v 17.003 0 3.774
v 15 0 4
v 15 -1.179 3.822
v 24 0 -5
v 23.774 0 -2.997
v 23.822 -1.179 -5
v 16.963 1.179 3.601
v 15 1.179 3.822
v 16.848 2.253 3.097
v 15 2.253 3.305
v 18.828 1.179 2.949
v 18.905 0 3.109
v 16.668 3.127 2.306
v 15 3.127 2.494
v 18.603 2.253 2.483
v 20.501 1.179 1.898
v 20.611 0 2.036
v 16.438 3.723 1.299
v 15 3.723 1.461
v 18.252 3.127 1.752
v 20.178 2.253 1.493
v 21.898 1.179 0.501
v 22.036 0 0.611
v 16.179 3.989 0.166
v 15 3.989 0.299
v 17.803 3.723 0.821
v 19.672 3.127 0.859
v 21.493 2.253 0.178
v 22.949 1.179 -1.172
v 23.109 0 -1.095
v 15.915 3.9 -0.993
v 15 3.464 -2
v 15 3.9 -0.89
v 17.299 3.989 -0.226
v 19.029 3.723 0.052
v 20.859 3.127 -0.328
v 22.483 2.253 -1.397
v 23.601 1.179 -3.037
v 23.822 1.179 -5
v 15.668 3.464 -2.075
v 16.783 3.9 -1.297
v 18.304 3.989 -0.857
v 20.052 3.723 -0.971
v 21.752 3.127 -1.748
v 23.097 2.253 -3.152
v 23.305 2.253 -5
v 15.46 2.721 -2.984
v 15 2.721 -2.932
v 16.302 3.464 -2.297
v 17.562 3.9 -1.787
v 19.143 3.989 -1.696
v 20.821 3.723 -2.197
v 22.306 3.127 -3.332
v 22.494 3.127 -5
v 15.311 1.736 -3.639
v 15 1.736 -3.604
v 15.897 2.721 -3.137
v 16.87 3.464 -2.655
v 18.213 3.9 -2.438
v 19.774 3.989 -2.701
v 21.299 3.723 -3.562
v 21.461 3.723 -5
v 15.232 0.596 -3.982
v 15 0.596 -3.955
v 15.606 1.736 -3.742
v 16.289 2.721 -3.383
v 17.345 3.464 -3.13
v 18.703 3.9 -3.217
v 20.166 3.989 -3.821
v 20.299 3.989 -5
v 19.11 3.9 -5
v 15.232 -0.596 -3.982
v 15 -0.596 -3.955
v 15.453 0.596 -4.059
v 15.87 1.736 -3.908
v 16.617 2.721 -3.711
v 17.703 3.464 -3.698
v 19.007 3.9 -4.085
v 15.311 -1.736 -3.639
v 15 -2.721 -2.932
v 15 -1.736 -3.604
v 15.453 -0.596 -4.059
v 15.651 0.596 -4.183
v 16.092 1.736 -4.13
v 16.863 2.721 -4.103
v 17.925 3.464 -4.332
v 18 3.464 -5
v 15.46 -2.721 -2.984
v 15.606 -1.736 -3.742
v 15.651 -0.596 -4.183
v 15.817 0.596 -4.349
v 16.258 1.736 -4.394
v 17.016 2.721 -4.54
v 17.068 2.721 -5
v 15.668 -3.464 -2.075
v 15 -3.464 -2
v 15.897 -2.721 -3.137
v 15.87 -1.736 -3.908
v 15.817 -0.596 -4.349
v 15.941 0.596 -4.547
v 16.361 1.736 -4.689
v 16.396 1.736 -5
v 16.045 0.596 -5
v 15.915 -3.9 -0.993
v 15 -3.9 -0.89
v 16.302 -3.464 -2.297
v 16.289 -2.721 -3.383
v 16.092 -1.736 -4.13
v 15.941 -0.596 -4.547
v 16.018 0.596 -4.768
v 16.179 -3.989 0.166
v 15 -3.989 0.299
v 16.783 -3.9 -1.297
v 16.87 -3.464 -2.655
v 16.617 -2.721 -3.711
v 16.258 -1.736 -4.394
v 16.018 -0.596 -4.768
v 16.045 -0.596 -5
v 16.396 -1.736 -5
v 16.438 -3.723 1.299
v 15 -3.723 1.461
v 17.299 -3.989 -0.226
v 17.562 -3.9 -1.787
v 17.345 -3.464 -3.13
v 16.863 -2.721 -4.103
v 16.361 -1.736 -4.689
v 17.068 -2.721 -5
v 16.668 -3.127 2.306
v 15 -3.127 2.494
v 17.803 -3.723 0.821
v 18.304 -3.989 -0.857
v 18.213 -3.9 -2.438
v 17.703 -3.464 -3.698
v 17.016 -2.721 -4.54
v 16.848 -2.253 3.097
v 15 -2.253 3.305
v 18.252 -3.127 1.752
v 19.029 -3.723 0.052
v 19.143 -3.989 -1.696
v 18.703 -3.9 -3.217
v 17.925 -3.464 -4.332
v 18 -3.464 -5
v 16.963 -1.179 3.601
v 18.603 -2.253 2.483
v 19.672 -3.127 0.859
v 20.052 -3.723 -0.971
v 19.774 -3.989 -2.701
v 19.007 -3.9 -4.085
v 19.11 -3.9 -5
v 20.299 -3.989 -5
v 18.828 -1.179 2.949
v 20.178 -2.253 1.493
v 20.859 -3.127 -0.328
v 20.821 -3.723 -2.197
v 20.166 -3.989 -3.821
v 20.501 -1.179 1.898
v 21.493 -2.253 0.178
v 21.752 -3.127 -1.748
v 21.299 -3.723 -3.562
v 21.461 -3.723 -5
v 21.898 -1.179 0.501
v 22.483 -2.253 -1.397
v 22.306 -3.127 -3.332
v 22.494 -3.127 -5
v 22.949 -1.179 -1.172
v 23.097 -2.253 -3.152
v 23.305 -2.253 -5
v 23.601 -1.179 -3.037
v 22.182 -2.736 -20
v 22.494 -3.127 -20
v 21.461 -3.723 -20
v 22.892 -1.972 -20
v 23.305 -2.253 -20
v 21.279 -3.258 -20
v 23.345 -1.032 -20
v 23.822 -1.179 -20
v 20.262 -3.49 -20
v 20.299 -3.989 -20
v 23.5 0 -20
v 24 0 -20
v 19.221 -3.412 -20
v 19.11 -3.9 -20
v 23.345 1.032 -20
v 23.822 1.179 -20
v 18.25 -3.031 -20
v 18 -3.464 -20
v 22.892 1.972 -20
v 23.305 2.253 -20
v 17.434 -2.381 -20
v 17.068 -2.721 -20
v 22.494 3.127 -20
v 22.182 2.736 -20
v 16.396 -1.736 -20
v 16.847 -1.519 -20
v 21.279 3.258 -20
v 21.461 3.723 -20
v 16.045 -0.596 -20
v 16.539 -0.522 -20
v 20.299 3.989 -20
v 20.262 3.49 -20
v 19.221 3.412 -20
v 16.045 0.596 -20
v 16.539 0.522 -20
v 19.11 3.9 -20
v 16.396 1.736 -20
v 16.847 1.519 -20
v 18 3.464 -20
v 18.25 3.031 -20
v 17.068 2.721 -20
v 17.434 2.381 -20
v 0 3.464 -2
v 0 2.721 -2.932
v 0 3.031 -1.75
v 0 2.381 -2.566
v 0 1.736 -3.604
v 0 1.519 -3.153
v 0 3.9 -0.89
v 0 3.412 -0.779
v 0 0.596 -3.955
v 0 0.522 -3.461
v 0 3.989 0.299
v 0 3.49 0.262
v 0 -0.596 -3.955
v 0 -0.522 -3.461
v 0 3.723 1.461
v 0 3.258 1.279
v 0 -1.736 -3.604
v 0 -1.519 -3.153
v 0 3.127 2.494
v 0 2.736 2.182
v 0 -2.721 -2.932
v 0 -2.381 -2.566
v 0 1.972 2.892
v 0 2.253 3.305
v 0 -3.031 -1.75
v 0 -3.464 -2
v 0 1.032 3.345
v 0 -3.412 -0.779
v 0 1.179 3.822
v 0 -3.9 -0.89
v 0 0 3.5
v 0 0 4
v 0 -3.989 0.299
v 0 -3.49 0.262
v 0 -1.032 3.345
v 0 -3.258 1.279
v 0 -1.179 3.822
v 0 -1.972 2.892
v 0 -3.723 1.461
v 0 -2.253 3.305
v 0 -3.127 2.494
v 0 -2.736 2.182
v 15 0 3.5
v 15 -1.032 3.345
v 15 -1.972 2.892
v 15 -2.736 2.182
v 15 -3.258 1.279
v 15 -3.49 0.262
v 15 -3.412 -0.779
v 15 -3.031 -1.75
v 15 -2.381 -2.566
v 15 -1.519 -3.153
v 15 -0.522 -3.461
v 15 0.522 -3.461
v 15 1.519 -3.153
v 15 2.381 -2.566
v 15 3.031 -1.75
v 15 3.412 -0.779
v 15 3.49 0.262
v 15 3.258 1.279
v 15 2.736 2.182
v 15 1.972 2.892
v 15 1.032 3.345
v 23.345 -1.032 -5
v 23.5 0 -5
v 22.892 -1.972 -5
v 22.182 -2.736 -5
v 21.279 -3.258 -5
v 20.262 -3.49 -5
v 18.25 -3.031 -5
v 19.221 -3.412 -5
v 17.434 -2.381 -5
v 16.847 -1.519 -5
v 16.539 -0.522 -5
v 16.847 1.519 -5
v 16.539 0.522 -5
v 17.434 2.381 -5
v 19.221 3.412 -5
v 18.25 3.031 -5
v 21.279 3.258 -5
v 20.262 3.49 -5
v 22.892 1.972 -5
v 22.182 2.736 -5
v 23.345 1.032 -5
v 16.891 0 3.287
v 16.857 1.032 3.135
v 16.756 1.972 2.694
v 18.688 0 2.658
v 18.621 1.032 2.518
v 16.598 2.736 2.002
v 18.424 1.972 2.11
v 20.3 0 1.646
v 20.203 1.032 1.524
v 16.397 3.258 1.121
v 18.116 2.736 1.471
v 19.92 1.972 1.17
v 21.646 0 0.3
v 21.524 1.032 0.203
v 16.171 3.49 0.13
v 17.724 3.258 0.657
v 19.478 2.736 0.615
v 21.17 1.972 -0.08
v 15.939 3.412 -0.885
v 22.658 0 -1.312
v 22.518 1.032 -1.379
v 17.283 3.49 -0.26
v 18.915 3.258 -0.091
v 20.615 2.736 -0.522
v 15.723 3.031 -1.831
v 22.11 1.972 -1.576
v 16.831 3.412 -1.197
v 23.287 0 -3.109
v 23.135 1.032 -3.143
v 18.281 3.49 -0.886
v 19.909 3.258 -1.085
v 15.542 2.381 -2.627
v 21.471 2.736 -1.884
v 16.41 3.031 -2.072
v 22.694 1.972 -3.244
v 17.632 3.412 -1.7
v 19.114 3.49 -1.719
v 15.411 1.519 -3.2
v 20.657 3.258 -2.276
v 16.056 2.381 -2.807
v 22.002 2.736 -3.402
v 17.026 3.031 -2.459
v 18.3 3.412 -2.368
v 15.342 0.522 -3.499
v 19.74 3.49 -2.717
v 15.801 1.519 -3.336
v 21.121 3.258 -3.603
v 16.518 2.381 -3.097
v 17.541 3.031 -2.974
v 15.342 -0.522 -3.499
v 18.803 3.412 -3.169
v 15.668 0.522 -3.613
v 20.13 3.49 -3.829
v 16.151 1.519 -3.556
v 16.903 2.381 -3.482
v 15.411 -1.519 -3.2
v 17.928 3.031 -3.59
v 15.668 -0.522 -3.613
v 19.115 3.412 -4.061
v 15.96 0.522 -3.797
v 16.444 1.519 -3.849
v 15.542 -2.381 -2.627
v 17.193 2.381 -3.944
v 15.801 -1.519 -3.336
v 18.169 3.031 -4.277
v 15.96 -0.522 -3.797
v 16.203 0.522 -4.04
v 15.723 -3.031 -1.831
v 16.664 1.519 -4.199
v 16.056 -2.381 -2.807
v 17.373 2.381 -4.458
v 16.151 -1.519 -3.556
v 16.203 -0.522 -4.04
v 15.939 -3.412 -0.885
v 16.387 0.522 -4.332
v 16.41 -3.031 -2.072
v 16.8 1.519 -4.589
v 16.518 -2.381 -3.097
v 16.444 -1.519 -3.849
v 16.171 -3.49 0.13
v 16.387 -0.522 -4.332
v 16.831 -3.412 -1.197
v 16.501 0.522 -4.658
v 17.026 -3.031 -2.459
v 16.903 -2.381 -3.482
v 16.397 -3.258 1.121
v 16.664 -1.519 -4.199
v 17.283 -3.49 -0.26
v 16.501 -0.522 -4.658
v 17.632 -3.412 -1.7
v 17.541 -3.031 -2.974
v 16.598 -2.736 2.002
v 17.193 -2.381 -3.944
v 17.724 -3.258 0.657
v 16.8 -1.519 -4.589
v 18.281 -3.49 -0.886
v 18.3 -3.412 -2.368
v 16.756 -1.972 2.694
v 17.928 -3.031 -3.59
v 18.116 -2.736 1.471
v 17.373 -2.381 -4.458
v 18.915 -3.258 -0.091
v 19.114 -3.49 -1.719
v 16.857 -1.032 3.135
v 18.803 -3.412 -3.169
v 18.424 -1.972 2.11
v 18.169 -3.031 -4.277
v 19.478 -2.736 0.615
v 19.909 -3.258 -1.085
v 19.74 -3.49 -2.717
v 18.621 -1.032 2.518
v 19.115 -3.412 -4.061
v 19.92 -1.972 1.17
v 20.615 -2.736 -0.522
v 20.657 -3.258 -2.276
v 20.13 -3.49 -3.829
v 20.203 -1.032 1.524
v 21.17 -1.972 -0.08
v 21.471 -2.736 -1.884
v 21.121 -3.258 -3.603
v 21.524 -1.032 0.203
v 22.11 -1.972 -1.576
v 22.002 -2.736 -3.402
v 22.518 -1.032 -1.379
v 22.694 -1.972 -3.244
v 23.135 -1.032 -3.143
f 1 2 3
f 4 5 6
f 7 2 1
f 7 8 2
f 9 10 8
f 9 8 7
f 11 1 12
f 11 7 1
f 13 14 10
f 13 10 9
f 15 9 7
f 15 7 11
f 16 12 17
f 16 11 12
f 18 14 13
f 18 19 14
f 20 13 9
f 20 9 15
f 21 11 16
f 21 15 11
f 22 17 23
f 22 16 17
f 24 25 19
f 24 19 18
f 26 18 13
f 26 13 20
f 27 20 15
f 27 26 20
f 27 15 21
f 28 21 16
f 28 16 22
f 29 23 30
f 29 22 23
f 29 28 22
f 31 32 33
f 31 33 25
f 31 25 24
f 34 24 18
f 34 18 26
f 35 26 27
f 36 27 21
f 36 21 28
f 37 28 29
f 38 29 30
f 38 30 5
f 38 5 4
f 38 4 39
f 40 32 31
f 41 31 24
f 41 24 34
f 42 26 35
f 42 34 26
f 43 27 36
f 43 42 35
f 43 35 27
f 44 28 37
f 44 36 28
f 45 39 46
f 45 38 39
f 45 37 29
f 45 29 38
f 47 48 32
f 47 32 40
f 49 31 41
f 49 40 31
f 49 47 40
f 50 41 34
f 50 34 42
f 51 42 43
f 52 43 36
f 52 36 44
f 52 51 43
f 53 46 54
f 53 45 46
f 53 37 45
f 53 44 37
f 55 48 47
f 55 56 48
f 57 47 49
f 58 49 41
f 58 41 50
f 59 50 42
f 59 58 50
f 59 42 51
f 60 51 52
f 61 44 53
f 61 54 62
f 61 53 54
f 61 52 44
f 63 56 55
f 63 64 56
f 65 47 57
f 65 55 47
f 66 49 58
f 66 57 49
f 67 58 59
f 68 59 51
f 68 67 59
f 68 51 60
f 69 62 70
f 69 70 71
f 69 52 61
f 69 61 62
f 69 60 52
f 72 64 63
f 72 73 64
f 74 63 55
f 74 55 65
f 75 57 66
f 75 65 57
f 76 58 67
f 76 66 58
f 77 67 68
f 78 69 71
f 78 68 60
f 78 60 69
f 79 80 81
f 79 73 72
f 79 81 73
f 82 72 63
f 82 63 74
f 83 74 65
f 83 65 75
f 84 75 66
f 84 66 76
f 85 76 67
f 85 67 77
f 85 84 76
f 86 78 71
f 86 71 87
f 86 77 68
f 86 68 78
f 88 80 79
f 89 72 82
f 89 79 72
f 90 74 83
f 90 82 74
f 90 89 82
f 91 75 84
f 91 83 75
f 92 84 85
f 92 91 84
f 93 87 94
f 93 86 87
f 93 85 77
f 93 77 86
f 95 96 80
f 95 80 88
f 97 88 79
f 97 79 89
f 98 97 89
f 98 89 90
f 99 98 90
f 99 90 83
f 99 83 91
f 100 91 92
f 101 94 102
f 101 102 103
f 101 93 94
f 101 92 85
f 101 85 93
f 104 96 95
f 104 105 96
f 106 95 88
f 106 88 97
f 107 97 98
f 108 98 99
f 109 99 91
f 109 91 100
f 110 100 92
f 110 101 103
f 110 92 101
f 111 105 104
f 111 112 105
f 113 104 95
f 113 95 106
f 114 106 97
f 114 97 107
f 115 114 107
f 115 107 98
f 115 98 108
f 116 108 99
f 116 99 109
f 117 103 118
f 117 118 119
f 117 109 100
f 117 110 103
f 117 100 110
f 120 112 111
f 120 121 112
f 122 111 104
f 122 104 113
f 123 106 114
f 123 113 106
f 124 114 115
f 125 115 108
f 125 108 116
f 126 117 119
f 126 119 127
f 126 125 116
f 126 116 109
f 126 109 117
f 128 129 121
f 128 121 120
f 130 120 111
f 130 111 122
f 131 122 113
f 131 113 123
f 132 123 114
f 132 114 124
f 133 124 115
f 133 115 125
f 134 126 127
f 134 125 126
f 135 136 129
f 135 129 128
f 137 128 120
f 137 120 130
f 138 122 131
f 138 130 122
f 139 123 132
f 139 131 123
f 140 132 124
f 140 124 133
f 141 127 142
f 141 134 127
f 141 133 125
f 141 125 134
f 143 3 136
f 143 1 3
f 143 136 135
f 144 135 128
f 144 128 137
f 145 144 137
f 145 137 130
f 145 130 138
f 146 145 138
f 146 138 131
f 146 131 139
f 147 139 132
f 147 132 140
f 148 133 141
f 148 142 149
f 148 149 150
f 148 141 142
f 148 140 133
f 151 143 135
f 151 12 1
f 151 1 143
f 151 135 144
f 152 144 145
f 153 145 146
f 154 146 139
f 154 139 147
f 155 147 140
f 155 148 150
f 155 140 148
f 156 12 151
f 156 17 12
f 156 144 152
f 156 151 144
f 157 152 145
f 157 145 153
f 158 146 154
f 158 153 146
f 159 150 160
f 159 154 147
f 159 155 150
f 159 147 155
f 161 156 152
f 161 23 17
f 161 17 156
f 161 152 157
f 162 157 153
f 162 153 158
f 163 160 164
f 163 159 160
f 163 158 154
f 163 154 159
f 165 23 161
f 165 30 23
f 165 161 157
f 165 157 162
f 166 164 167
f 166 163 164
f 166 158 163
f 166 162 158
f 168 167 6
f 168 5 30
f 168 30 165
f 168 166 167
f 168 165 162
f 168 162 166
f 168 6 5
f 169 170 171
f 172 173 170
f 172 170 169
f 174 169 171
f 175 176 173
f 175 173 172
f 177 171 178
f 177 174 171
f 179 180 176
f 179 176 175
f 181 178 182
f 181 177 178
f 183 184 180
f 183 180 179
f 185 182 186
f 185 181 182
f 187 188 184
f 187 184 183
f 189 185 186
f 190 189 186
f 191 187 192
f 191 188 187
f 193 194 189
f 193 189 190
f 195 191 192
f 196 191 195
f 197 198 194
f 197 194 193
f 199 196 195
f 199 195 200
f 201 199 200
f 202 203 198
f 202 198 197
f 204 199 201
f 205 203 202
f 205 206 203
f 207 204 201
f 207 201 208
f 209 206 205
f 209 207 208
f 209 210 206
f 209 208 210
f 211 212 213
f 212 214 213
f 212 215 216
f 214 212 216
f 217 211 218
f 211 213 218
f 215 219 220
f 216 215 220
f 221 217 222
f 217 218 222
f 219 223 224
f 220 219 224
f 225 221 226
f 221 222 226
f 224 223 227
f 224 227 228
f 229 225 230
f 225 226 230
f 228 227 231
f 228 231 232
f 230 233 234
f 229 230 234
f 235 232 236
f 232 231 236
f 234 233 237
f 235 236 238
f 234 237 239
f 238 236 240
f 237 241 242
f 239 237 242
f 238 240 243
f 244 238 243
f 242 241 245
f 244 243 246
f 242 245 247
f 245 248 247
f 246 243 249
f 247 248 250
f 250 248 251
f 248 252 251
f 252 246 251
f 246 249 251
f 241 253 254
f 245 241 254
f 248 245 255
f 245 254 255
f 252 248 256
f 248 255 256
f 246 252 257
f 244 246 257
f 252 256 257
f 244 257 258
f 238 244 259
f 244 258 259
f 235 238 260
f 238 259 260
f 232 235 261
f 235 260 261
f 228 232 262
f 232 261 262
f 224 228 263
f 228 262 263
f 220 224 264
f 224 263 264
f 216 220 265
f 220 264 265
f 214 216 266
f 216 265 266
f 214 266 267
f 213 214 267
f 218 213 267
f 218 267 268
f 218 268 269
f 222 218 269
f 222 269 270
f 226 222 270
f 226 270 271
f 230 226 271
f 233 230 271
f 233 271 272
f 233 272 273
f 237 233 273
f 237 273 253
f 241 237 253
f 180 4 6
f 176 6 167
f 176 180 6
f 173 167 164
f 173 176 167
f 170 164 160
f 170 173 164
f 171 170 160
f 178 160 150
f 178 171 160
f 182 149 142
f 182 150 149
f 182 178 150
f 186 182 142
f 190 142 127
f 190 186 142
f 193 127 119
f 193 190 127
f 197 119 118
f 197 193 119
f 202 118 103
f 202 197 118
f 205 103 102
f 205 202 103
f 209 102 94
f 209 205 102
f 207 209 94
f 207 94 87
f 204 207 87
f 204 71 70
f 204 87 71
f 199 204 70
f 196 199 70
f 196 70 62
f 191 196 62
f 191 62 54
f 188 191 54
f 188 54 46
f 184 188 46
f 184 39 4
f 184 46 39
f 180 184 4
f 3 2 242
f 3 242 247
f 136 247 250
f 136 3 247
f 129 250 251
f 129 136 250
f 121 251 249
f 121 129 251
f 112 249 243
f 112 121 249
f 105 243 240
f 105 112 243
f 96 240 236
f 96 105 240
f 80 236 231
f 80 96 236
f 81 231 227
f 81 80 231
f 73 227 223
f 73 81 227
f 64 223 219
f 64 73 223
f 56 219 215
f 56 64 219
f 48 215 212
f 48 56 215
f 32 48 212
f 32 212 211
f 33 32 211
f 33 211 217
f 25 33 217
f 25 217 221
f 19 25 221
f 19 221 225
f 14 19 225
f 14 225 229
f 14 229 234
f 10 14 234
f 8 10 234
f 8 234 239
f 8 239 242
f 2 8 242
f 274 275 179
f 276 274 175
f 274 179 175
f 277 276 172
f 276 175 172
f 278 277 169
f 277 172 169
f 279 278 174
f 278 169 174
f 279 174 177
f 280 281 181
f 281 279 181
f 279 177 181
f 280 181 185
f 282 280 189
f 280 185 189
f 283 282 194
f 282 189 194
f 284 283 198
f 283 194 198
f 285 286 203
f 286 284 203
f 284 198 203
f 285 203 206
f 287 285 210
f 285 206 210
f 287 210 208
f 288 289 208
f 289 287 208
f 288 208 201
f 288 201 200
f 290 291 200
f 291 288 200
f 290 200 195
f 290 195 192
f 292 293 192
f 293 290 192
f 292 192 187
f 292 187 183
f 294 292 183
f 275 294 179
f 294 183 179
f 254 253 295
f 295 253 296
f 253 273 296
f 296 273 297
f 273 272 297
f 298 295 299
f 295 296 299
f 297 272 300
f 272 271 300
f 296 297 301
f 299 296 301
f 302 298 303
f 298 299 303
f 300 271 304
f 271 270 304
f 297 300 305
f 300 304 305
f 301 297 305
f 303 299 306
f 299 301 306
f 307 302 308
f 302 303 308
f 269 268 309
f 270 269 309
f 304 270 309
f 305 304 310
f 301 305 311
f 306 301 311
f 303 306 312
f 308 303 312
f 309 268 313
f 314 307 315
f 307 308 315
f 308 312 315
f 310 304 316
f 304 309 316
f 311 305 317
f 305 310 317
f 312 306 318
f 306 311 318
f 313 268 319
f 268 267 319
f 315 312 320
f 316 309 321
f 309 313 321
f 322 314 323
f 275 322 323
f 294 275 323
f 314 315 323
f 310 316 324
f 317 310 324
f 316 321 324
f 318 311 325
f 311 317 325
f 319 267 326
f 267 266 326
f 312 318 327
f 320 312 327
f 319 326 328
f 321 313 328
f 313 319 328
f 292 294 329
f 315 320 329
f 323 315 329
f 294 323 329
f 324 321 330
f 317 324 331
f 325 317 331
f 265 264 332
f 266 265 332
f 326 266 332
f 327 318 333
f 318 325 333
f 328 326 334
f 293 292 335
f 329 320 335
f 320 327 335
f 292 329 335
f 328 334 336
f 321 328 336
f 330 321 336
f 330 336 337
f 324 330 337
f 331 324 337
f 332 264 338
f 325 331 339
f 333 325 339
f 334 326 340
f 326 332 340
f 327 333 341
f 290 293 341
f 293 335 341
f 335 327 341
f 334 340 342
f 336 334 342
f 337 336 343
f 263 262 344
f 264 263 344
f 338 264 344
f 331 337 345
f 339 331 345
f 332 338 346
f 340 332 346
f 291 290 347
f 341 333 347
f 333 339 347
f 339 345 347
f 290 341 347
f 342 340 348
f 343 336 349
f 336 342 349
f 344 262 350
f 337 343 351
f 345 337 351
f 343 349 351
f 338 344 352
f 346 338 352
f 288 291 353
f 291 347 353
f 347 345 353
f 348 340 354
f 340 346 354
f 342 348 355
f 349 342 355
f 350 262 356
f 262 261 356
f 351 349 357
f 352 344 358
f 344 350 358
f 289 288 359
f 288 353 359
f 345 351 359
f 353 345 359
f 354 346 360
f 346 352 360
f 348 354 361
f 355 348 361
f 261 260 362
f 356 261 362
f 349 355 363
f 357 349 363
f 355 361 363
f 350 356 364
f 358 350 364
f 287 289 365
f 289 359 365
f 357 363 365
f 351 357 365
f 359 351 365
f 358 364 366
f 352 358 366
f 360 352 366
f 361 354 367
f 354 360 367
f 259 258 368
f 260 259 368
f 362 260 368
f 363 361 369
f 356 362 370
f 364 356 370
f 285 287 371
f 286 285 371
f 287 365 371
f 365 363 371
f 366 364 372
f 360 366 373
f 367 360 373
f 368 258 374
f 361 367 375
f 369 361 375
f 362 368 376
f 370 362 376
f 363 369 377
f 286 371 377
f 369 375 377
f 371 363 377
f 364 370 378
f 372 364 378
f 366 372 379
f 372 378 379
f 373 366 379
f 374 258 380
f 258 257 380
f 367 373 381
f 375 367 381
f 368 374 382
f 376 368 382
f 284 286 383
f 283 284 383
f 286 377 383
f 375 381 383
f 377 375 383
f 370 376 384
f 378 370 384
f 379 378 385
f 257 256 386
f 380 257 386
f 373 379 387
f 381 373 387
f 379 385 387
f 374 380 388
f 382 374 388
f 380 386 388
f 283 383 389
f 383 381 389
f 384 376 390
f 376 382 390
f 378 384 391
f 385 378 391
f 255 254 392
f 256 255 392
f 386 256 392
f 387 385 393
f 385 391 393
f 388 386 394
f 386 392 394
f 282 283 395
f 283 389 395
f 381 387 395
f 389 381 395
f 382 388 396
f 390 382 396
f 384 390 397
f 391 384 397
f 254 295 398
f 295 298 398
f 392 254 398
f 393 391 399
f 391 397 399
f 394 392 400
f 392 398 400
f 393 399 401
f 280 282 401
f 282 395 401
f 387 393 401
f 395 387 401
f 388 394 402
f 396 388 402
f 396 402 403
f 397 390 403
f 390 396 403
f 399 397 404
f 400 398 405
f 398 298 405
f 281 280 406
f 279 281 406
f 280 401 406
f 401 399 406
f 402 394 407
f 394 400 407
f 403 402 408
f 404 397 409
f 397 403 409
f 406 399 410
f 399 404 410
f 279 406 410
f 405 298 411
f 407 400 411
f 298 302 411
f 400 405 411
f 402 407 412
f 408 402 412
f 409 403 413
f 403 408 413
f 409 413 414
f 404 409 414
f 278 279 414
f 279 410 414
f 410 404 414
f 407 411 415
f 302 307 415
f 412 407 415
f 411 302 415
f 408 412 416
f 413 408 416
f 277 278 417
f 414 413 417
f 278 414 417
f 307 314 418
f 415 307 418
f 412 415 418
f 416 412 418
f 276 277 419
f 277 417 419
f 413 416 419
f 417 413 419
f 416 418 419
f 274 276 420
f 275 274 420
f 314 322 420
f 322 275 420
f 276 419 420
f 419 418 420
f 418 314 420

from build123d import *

# Parameters (mm, degrees)
SWEEP_THIN1_PROFILE_R   = 4
SWEEP_THIN1_PROFILE_R_2 = 3.5


with BuildPart() as part:
    # Sweep-Thin1: sweep along a path in Sketch1
    with BuildLine(Plane(origin=(0, 0, 0), x_dir=(1, 0, 0), z_dir=(0, 1, 0))) as sweep_thin1_path:
        Line((0, 0), (15, 0))
        ThreePointArc((15, 0), (18.535533906, 1.464466094), (20, 5))
        Line((20, 5), (20, 20))
    # Sweep-Thin1 profile (on start of the path) → Sweep-Thin1 (sweep)
    with BuildSketch(Plane(origin=(0, 0, 0), x_dir=(0, 0, 1), z_dir=(1, 0, 0))):
        Circle(SWEEP_THIN1_PROFILE_R)
        Circle(SWEEP_THIN1_PROFILE_R_2, mode=Mode.SUBTRACT)
    sweep(path=sweep_thin1_path.line)


solid = part.part
